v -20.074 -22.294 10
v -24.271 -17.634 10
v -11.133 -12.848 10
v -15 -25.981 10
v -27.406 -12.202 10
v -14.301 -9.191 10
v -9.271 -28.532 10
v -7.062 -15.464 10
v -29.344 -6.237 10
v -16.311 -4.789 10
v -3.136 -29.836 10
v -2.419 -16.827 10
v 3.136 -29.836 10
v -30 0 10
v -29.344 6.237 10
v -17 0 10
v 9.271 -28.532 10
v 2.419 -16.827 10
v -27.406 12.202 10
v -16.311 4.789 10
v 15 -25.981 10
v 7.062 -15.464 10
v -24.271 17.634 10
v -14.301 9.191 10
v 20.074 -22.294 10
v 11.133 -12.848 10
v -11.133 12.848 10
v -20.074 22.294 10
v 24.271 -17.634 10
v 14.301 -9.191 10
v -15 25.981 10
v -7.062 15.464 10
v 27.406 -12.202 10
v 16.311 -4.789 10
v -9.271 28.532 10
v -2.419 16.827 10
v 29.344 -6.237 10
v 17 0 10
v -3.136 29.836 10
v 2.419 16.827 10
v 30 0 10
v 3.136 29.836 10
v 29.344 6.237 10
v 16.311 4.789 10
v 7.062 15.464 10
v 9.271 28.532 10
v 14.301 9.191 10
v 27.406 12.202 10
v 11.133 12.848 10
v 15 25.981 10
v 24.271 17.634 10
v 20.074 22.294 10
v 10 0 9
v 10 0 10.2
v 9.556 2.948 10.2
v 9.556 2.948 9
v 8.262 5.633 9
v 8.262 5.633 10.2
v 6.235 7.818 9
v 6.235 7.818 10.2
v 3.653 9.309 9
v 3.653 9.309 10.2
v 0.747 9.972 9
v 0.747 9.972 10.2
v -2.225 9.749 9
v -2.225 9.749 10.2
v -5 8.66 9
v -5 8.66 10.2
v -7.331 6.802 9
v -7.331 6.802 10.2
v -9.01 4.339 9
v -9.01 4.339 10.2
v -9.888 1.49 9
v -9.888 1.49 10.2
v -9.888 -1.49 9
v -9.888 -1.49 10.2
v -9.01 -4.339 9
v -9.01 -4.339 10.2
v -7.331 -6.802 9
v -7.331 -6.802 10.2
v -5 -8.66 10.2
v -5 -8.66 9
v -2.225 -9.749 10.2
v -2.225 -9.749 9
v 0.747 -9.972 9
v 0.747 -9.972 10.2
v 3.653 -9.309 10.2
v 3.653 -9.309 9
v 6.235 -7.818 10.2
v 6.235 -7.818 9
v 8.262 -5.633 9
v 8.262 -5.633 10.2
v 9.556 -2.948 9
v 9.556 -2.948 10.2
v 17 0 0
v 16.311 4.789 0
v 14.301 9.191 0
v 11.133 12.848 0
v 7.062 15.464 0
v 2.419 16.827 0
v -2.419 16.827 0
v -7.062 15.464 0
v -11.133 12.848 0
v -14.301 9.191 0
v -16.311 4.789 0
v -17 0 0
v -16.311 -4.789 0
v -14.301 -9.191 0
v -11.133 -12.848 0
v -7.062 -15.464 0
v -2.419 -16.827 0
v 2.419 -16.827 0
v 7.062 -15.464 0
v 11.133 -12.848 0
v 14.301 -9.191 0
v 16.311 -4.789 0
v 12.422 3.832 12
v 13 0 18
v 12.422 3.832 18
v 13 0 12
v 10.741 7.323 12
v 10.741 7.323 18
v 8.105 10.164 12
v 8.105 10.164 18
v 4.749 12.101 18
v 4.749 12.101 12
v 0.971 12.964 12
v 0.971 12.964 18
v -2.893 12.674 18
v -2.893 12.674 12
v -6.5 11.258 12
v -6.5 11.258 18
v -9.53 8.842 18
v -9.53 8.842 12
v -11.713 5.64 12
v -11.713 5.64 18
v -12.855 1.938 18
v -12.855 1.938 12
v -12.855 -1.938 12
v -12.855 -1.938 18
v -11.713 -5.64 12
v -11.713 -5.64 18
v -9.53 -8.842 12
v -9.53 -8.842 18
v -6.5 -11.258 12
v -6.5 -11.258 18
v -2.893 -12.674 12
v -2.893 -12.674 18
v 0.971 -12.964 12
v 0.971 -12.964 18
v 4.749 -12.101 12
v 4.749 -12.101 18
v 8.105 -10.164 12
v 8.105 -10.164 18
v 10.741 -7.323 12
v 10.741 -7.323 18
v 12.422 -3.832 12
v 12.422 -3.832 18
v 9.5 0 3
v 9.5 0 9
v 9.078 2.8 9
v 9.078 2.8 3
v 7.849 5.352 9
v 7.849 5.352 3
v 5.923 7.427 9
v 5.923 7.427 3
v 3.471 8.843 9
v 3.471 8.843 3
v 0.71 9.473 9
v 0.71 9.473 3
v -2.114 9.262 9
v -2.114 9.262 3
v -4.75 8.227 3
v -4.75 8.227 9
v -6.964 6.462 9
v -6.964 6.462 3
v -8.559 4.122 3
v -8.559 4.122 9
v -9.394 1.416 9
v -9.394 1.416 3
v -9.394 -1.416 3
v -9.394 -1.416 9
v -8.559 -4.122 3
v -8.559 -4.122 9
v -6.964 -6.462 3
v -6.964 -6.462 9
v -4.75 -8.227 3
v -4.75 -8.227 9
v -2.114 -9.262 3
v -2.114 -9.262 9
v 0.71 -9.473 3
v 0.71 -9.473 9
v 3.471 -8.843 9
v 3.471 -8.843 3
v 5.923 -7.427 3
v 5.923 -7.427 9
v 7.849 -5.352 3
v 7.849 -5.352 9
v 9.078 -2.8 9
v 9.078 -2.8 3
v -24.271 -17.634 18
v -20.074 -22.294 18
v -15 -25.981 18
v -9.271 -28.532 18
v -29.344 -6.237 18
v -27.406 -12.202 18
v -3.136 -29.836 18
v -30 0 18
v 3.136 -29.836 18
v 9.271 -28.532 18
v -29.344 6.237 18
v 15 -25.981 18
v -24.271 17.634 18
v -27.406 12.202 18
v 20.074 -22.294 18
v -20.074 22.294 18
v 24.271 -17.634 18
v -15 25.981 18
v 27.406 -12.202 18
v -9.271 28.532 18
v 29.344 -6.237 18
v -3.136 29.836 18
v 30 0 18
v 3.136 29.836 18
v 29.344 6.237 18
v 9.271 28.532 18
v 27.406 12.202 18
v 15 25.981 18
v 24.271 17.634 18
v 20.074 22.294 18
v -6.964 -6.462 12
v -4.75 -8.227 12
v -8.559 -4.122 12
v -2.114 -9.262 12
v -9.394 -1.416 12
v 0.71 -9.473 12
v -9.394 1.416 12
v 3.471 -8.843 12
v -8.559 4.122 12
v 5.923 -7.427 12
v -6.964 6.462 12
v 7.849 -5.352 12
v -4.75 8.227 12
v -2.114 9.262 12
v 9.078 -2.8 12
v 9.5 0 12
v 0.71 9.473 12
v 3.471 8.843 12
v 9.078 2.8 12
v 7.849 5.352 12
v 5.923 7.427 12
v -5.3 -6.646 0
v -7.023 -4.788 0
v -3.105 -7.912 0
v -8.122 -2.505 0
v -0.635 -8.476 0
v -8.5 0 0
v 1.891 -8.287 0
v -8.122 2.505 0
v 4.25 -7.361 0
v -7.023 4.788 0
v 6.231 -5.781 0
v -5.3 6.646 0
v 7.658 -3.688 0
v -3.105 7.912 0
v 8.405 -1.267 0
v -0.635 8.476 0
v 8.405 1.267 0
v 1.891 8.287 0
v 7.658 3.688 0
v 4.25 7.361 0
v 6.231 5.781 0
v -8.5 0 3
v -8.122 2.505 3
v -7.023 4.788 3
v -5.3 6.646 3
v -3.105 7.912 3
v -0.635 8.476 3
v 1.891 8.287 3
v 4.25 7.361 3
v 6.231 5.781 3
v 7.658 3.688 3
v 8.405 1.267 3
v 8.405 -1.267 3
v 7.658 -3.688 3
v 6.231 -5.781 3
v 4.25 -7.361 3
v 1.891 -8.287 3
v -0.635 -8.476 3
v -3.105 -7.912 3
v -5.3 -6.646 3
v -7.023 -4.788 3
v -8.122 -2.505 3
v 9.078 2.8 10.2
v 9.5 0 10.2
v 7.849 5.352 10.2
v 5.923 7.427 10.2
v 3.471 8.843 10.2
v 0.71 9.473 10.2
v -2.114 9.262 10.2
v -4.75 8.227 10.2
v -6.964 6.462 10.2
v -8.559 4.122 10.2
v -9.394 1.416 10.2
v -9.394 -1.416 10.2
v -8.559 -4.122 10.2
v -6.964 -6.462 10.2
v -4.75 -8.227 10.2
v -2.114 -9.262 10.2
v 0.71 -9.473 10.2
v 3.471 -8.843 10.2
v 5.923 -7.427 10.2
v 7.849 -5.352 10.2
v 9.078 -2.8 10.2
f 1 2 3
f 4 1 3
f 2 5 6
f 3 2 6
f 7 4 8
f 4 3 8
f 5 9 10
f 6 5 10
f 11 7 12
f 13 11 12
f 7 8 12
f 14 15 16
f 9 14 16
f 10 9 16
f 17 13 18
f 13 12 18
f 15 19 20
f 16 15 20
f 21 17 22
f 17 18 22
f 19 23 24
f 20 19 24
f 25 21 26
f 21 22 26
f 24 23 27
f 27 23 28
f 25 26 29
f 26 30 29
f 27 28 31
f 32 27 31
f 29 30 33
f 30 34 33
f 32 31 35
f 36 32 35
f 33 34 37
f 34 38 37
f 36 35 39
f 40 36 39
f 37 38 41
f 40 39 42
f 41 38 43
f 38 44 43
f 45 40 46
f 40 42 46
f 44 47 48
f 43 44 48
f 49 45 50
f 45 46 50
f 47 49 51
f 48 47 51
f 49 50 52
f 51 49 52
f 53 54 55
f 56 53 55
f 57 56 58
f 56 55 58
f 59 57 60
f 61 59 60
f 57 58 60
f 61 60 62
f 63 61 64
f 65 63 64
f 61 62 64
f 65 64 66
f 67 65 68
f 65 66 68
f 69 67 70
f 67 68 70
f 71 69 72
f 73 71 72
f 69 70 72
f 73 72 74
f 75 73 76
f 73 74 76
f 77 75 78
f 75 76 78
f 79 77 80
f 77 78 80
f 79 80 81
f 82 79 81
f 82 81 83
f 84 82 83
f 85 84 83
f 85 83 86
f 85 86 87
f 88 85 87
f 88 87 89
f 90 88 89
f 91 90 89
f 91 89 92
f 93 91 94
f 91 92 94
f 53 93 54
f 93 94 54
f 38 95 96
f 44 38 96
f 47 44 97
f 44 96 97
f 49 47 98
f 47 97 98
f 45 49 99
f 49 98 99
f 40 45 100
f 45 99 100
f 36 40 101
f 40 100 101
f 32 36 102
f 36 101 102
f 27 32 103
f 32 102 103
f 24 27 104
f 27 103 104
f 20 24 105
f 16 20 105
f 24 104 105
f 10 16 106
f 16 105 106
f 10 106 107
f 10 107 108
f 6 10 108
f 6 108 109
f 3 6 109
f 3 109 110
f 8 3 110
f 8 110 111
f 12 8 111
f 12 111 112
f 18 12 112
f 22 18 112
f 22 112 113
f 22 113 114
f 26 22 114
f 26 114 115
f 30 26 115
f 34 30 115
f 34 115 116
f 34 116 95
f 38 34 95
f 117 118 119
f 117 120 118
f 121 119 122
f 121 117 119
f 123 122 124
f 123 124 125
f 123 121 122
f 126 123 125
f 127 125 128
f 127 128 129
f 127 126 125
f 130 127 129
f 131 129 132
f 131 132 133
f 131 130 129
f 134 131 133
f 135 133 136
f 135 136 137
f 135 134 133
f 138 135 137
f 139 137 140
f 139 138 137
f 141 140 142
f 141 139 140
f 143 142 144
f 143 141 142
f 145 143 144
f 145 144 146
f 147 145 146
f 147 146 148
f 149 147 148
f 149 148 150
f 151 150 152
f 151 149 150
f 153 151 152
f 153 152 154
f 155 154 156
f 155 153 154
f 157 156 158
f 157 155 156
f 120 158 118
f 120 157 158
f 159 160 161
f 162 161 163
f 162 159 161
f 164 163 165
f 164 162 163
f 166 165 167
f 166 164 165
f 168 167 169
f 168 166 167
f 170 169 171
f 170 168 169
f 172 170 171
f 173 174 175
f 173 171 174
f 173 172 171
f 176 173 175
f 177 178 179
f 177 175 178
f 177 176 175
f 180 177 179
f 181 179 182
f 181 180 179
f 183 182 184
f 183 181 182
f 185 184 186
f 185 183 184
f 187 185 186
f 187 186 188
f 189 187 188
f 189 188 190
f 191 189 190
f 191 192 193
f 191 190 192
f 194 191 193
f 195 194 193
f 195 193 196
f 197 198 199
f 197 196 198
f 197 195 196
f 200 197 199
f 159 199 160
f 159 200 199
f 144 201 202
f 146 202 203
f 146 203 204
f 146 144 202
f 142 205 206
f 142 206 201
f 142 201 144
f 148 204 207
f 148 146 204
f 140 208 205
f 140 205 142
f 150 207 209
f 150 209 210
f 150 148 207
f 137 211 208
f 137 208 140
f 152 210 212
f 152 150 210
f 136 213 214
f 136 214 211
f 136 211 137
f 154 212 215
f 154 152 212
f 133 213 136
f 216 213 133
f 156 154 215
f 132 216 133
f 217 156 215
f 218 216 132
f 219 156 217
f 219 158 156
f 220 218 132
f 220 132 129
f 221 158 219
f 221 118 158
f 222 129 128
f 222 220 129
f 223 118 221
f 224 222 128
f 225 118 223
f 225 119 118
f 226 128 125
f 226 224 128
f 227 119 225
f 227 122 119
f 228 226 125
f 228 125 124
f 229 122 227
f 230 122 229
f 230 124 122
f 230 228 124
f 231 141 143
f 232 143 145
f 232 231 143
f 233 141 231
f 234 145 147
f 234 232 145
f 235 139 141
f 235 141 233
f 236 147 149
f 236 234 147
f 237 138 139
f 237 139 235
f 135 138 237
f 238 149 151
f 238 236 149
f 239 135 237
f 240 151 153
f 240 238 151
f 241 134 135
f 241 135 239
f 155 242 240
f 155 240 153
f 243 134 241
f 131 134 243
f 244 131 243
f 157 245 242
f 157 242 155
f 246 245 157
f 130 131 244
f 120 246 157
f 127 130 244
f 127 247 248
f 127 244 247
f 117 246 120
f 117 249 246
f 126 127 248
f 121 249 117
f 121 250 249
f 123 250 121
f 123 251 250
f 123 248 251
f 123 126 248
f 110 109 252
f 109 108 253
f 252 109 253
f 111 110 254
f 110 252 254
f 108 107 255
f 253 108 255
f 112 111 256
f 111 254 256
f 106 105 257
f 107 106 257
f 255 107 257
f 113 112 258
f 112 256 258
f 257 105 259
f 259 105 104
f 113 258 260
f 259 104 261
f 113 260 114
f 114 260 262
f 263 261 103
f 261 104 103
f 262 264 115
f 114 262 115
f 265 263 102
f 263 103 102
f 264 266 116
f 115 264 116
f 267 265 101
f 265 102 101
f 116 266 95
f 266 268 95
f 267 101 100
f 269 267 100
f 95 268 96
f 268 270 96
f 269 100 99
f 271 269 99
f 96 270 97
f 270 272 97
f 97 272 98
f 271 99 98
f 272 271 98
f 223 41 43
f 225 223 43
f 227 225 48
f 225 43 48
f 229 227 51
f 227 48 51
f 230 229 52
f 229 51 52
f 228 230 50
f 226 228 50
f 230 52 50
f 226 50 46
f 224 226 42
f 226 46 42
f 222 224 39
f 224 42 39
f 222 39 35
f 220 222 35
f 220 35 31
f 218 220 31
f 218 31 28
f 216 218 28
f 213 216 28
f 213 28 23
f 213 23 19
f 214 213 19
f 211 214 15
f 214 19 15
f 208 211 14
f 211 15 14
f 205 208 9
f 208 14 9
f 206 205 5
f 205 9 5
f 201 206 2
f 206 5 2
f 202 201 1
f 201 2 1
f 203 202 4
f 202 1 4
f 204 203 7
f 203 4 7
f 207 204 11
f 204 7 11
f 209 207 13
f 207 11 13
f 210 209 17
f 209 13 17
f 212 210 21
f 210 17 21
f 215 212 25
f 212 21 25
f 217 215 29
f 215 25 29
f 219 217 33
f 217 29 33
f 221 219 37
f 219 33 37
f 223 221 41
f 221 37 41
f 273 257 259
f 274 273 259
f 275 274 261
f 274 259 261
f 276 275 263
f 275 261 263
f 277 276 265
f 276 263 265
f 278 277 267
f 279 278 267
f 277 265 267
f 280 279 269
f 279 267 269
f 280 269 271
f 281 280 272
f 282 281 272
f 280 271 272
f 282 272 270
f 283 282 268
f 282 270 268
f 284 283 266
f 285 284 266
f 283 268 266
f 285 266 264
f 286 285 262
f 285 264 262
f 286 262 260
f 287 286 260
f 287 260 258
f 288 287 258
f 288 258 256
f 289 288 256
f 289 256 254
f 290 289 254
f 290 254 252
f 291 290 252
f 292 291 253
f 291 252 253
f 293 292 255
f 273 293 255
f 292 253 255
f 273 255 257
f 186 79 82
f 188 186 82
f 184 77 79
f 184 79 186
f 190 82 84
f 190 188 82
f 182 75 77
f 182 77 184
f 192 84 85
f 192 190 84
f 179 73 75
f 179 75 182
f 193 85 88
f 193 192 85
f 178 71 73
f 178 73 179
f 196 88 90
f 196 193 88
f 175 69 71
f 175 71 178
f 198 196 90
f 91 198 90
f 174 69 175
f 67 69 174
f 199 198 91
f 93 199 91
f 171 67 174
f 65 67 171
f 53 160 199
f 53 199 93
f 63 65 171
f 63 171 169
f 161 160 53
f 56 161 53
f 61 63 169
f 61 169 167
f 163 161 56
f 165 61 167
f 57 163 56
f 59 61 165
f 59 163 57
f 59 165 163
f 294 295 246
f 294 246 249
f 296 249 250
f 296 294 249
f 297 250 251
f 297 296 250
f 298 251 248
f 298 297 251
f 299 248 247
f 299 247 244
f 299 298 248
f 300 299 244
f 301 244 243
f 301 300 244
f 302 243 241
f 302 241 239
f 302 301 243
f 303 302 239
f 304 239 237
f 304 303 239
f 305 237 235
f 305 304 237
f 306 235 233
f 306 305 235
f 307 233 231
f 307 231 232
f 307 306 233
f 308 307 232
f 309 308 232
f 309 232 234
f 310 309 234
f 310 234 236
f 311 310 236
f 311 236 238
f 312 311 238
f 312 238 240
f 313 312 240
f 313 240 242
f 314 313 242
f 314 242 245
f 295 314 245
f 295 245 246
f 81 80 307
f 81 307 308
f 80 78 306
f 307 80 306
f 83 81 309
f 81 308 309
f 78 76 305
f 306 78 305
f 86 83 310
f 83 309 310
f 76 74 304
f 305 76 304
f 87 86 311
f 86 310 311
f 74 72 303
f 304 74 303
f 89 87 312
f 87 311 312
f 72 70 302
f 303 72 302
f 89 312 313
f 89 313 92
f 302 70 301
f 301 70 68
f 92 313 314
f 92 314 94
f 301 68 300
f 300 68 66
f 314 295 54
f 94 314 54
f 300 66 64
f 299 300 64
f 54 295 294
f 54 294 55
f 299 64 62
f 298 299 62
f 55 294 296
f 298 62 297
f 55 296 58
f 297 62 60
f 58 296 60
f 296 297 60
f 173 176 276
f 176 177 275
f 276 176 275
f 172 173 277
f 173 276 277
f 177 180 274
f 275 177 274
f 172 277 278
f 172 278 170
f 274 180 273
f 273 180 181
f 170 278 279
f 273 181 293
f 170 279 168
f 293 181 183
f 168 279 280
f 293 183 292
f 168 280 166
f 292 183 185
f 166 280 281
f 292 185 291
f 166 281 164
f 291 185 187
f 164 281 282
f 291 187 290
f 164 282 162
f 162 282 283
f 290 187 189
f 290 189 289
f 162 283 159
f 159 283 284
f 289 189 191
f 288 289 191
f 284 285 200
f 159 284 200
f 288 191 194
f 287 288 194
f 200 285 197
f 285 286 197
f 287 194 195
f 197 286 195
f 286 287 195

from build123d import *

# Parameters (mm, degrees)
SKETCH1_R           = 17
SKETCH1_R_2         = 13
BOSS_EXTRUDE1_DEPTH = 10
SKETCH2_R           = 30
SKETCH2_R_2         = 13
BOSS_EXTRUDE2_DEPTH = 8
SKETCH6_R           = 17
SKETCH6_R_2         = 8.5
BOSS_EXTRUDE3_DEPTH = 3
SKETCH7_R           = 13
SKETCH7_R_2         = 9.5
BOSS_EXTRUDE4_DEPTH = 9
CUT_EXTRUDE2_START  = -1.8
SKETCH8_R           = 10
CUT_EXTRUDE2_DEPTH  = 1.2


with BuildPart() as part:
    # Sketch1 → Boss-Extrude1 (new body)
    with BuildSketch(Plane.XY):
        Circle(SKETCH1_R)
        Circle(SKETCH1_R_2, mode=Mode.SUBTRACT)
    extrude(amount=BOSS_EXTRUDE1_DEPTH)

    # Sketch2 → Boss-Extrude2 (add)
    with BuildSketch(Plane.XY.offset(10)):
        Circle(SKETCH2_R)
        Circle(SKETCH2_R_2, mode=Mode.SUBTRACT)
    extrude(amount=BOSS_EXTRUDE2_DEPTH)

    # Sketch6 → Boss-Extrude3 (add)
    with BuildSketch(Plane(origin=(0, 0, 0), x_dir=(-1, 0, 0), z_dir=(0, 0, -1))):
        with Locations(Location((0, 0, 0), (0, 0, 180))):
            Circle(SKETCH6_R)
        Circle(SKETCH6_R_2, mode=Mode.SUBTRACT)
    extrude(amount=-BOSS_EXTRUDE3_DEPTH)

    # Sketch7 → Boss-Extrude4 (add)
    with BuildSketch(Plane.XY.offset(3)):
        Circle(SKETCH7_R)
        Circle(SKETCH7_R_2, mode=Mode.SUBTRACT)
    extrude(amount=BOSS_EXTRUDE4_DEPTH)

    # Sketch8 → Cut-Extrude2 (cut)
    with BuildSketch(Plane.XY.offset(12).offset(CUT_EXTRUDE2_START)):
        Circle(SKETCH8_R)
    extrude(amount=-CUT_EXTRUDE2_DEPTH, mode=Mode.SUBTRACT)


solid = part.part
